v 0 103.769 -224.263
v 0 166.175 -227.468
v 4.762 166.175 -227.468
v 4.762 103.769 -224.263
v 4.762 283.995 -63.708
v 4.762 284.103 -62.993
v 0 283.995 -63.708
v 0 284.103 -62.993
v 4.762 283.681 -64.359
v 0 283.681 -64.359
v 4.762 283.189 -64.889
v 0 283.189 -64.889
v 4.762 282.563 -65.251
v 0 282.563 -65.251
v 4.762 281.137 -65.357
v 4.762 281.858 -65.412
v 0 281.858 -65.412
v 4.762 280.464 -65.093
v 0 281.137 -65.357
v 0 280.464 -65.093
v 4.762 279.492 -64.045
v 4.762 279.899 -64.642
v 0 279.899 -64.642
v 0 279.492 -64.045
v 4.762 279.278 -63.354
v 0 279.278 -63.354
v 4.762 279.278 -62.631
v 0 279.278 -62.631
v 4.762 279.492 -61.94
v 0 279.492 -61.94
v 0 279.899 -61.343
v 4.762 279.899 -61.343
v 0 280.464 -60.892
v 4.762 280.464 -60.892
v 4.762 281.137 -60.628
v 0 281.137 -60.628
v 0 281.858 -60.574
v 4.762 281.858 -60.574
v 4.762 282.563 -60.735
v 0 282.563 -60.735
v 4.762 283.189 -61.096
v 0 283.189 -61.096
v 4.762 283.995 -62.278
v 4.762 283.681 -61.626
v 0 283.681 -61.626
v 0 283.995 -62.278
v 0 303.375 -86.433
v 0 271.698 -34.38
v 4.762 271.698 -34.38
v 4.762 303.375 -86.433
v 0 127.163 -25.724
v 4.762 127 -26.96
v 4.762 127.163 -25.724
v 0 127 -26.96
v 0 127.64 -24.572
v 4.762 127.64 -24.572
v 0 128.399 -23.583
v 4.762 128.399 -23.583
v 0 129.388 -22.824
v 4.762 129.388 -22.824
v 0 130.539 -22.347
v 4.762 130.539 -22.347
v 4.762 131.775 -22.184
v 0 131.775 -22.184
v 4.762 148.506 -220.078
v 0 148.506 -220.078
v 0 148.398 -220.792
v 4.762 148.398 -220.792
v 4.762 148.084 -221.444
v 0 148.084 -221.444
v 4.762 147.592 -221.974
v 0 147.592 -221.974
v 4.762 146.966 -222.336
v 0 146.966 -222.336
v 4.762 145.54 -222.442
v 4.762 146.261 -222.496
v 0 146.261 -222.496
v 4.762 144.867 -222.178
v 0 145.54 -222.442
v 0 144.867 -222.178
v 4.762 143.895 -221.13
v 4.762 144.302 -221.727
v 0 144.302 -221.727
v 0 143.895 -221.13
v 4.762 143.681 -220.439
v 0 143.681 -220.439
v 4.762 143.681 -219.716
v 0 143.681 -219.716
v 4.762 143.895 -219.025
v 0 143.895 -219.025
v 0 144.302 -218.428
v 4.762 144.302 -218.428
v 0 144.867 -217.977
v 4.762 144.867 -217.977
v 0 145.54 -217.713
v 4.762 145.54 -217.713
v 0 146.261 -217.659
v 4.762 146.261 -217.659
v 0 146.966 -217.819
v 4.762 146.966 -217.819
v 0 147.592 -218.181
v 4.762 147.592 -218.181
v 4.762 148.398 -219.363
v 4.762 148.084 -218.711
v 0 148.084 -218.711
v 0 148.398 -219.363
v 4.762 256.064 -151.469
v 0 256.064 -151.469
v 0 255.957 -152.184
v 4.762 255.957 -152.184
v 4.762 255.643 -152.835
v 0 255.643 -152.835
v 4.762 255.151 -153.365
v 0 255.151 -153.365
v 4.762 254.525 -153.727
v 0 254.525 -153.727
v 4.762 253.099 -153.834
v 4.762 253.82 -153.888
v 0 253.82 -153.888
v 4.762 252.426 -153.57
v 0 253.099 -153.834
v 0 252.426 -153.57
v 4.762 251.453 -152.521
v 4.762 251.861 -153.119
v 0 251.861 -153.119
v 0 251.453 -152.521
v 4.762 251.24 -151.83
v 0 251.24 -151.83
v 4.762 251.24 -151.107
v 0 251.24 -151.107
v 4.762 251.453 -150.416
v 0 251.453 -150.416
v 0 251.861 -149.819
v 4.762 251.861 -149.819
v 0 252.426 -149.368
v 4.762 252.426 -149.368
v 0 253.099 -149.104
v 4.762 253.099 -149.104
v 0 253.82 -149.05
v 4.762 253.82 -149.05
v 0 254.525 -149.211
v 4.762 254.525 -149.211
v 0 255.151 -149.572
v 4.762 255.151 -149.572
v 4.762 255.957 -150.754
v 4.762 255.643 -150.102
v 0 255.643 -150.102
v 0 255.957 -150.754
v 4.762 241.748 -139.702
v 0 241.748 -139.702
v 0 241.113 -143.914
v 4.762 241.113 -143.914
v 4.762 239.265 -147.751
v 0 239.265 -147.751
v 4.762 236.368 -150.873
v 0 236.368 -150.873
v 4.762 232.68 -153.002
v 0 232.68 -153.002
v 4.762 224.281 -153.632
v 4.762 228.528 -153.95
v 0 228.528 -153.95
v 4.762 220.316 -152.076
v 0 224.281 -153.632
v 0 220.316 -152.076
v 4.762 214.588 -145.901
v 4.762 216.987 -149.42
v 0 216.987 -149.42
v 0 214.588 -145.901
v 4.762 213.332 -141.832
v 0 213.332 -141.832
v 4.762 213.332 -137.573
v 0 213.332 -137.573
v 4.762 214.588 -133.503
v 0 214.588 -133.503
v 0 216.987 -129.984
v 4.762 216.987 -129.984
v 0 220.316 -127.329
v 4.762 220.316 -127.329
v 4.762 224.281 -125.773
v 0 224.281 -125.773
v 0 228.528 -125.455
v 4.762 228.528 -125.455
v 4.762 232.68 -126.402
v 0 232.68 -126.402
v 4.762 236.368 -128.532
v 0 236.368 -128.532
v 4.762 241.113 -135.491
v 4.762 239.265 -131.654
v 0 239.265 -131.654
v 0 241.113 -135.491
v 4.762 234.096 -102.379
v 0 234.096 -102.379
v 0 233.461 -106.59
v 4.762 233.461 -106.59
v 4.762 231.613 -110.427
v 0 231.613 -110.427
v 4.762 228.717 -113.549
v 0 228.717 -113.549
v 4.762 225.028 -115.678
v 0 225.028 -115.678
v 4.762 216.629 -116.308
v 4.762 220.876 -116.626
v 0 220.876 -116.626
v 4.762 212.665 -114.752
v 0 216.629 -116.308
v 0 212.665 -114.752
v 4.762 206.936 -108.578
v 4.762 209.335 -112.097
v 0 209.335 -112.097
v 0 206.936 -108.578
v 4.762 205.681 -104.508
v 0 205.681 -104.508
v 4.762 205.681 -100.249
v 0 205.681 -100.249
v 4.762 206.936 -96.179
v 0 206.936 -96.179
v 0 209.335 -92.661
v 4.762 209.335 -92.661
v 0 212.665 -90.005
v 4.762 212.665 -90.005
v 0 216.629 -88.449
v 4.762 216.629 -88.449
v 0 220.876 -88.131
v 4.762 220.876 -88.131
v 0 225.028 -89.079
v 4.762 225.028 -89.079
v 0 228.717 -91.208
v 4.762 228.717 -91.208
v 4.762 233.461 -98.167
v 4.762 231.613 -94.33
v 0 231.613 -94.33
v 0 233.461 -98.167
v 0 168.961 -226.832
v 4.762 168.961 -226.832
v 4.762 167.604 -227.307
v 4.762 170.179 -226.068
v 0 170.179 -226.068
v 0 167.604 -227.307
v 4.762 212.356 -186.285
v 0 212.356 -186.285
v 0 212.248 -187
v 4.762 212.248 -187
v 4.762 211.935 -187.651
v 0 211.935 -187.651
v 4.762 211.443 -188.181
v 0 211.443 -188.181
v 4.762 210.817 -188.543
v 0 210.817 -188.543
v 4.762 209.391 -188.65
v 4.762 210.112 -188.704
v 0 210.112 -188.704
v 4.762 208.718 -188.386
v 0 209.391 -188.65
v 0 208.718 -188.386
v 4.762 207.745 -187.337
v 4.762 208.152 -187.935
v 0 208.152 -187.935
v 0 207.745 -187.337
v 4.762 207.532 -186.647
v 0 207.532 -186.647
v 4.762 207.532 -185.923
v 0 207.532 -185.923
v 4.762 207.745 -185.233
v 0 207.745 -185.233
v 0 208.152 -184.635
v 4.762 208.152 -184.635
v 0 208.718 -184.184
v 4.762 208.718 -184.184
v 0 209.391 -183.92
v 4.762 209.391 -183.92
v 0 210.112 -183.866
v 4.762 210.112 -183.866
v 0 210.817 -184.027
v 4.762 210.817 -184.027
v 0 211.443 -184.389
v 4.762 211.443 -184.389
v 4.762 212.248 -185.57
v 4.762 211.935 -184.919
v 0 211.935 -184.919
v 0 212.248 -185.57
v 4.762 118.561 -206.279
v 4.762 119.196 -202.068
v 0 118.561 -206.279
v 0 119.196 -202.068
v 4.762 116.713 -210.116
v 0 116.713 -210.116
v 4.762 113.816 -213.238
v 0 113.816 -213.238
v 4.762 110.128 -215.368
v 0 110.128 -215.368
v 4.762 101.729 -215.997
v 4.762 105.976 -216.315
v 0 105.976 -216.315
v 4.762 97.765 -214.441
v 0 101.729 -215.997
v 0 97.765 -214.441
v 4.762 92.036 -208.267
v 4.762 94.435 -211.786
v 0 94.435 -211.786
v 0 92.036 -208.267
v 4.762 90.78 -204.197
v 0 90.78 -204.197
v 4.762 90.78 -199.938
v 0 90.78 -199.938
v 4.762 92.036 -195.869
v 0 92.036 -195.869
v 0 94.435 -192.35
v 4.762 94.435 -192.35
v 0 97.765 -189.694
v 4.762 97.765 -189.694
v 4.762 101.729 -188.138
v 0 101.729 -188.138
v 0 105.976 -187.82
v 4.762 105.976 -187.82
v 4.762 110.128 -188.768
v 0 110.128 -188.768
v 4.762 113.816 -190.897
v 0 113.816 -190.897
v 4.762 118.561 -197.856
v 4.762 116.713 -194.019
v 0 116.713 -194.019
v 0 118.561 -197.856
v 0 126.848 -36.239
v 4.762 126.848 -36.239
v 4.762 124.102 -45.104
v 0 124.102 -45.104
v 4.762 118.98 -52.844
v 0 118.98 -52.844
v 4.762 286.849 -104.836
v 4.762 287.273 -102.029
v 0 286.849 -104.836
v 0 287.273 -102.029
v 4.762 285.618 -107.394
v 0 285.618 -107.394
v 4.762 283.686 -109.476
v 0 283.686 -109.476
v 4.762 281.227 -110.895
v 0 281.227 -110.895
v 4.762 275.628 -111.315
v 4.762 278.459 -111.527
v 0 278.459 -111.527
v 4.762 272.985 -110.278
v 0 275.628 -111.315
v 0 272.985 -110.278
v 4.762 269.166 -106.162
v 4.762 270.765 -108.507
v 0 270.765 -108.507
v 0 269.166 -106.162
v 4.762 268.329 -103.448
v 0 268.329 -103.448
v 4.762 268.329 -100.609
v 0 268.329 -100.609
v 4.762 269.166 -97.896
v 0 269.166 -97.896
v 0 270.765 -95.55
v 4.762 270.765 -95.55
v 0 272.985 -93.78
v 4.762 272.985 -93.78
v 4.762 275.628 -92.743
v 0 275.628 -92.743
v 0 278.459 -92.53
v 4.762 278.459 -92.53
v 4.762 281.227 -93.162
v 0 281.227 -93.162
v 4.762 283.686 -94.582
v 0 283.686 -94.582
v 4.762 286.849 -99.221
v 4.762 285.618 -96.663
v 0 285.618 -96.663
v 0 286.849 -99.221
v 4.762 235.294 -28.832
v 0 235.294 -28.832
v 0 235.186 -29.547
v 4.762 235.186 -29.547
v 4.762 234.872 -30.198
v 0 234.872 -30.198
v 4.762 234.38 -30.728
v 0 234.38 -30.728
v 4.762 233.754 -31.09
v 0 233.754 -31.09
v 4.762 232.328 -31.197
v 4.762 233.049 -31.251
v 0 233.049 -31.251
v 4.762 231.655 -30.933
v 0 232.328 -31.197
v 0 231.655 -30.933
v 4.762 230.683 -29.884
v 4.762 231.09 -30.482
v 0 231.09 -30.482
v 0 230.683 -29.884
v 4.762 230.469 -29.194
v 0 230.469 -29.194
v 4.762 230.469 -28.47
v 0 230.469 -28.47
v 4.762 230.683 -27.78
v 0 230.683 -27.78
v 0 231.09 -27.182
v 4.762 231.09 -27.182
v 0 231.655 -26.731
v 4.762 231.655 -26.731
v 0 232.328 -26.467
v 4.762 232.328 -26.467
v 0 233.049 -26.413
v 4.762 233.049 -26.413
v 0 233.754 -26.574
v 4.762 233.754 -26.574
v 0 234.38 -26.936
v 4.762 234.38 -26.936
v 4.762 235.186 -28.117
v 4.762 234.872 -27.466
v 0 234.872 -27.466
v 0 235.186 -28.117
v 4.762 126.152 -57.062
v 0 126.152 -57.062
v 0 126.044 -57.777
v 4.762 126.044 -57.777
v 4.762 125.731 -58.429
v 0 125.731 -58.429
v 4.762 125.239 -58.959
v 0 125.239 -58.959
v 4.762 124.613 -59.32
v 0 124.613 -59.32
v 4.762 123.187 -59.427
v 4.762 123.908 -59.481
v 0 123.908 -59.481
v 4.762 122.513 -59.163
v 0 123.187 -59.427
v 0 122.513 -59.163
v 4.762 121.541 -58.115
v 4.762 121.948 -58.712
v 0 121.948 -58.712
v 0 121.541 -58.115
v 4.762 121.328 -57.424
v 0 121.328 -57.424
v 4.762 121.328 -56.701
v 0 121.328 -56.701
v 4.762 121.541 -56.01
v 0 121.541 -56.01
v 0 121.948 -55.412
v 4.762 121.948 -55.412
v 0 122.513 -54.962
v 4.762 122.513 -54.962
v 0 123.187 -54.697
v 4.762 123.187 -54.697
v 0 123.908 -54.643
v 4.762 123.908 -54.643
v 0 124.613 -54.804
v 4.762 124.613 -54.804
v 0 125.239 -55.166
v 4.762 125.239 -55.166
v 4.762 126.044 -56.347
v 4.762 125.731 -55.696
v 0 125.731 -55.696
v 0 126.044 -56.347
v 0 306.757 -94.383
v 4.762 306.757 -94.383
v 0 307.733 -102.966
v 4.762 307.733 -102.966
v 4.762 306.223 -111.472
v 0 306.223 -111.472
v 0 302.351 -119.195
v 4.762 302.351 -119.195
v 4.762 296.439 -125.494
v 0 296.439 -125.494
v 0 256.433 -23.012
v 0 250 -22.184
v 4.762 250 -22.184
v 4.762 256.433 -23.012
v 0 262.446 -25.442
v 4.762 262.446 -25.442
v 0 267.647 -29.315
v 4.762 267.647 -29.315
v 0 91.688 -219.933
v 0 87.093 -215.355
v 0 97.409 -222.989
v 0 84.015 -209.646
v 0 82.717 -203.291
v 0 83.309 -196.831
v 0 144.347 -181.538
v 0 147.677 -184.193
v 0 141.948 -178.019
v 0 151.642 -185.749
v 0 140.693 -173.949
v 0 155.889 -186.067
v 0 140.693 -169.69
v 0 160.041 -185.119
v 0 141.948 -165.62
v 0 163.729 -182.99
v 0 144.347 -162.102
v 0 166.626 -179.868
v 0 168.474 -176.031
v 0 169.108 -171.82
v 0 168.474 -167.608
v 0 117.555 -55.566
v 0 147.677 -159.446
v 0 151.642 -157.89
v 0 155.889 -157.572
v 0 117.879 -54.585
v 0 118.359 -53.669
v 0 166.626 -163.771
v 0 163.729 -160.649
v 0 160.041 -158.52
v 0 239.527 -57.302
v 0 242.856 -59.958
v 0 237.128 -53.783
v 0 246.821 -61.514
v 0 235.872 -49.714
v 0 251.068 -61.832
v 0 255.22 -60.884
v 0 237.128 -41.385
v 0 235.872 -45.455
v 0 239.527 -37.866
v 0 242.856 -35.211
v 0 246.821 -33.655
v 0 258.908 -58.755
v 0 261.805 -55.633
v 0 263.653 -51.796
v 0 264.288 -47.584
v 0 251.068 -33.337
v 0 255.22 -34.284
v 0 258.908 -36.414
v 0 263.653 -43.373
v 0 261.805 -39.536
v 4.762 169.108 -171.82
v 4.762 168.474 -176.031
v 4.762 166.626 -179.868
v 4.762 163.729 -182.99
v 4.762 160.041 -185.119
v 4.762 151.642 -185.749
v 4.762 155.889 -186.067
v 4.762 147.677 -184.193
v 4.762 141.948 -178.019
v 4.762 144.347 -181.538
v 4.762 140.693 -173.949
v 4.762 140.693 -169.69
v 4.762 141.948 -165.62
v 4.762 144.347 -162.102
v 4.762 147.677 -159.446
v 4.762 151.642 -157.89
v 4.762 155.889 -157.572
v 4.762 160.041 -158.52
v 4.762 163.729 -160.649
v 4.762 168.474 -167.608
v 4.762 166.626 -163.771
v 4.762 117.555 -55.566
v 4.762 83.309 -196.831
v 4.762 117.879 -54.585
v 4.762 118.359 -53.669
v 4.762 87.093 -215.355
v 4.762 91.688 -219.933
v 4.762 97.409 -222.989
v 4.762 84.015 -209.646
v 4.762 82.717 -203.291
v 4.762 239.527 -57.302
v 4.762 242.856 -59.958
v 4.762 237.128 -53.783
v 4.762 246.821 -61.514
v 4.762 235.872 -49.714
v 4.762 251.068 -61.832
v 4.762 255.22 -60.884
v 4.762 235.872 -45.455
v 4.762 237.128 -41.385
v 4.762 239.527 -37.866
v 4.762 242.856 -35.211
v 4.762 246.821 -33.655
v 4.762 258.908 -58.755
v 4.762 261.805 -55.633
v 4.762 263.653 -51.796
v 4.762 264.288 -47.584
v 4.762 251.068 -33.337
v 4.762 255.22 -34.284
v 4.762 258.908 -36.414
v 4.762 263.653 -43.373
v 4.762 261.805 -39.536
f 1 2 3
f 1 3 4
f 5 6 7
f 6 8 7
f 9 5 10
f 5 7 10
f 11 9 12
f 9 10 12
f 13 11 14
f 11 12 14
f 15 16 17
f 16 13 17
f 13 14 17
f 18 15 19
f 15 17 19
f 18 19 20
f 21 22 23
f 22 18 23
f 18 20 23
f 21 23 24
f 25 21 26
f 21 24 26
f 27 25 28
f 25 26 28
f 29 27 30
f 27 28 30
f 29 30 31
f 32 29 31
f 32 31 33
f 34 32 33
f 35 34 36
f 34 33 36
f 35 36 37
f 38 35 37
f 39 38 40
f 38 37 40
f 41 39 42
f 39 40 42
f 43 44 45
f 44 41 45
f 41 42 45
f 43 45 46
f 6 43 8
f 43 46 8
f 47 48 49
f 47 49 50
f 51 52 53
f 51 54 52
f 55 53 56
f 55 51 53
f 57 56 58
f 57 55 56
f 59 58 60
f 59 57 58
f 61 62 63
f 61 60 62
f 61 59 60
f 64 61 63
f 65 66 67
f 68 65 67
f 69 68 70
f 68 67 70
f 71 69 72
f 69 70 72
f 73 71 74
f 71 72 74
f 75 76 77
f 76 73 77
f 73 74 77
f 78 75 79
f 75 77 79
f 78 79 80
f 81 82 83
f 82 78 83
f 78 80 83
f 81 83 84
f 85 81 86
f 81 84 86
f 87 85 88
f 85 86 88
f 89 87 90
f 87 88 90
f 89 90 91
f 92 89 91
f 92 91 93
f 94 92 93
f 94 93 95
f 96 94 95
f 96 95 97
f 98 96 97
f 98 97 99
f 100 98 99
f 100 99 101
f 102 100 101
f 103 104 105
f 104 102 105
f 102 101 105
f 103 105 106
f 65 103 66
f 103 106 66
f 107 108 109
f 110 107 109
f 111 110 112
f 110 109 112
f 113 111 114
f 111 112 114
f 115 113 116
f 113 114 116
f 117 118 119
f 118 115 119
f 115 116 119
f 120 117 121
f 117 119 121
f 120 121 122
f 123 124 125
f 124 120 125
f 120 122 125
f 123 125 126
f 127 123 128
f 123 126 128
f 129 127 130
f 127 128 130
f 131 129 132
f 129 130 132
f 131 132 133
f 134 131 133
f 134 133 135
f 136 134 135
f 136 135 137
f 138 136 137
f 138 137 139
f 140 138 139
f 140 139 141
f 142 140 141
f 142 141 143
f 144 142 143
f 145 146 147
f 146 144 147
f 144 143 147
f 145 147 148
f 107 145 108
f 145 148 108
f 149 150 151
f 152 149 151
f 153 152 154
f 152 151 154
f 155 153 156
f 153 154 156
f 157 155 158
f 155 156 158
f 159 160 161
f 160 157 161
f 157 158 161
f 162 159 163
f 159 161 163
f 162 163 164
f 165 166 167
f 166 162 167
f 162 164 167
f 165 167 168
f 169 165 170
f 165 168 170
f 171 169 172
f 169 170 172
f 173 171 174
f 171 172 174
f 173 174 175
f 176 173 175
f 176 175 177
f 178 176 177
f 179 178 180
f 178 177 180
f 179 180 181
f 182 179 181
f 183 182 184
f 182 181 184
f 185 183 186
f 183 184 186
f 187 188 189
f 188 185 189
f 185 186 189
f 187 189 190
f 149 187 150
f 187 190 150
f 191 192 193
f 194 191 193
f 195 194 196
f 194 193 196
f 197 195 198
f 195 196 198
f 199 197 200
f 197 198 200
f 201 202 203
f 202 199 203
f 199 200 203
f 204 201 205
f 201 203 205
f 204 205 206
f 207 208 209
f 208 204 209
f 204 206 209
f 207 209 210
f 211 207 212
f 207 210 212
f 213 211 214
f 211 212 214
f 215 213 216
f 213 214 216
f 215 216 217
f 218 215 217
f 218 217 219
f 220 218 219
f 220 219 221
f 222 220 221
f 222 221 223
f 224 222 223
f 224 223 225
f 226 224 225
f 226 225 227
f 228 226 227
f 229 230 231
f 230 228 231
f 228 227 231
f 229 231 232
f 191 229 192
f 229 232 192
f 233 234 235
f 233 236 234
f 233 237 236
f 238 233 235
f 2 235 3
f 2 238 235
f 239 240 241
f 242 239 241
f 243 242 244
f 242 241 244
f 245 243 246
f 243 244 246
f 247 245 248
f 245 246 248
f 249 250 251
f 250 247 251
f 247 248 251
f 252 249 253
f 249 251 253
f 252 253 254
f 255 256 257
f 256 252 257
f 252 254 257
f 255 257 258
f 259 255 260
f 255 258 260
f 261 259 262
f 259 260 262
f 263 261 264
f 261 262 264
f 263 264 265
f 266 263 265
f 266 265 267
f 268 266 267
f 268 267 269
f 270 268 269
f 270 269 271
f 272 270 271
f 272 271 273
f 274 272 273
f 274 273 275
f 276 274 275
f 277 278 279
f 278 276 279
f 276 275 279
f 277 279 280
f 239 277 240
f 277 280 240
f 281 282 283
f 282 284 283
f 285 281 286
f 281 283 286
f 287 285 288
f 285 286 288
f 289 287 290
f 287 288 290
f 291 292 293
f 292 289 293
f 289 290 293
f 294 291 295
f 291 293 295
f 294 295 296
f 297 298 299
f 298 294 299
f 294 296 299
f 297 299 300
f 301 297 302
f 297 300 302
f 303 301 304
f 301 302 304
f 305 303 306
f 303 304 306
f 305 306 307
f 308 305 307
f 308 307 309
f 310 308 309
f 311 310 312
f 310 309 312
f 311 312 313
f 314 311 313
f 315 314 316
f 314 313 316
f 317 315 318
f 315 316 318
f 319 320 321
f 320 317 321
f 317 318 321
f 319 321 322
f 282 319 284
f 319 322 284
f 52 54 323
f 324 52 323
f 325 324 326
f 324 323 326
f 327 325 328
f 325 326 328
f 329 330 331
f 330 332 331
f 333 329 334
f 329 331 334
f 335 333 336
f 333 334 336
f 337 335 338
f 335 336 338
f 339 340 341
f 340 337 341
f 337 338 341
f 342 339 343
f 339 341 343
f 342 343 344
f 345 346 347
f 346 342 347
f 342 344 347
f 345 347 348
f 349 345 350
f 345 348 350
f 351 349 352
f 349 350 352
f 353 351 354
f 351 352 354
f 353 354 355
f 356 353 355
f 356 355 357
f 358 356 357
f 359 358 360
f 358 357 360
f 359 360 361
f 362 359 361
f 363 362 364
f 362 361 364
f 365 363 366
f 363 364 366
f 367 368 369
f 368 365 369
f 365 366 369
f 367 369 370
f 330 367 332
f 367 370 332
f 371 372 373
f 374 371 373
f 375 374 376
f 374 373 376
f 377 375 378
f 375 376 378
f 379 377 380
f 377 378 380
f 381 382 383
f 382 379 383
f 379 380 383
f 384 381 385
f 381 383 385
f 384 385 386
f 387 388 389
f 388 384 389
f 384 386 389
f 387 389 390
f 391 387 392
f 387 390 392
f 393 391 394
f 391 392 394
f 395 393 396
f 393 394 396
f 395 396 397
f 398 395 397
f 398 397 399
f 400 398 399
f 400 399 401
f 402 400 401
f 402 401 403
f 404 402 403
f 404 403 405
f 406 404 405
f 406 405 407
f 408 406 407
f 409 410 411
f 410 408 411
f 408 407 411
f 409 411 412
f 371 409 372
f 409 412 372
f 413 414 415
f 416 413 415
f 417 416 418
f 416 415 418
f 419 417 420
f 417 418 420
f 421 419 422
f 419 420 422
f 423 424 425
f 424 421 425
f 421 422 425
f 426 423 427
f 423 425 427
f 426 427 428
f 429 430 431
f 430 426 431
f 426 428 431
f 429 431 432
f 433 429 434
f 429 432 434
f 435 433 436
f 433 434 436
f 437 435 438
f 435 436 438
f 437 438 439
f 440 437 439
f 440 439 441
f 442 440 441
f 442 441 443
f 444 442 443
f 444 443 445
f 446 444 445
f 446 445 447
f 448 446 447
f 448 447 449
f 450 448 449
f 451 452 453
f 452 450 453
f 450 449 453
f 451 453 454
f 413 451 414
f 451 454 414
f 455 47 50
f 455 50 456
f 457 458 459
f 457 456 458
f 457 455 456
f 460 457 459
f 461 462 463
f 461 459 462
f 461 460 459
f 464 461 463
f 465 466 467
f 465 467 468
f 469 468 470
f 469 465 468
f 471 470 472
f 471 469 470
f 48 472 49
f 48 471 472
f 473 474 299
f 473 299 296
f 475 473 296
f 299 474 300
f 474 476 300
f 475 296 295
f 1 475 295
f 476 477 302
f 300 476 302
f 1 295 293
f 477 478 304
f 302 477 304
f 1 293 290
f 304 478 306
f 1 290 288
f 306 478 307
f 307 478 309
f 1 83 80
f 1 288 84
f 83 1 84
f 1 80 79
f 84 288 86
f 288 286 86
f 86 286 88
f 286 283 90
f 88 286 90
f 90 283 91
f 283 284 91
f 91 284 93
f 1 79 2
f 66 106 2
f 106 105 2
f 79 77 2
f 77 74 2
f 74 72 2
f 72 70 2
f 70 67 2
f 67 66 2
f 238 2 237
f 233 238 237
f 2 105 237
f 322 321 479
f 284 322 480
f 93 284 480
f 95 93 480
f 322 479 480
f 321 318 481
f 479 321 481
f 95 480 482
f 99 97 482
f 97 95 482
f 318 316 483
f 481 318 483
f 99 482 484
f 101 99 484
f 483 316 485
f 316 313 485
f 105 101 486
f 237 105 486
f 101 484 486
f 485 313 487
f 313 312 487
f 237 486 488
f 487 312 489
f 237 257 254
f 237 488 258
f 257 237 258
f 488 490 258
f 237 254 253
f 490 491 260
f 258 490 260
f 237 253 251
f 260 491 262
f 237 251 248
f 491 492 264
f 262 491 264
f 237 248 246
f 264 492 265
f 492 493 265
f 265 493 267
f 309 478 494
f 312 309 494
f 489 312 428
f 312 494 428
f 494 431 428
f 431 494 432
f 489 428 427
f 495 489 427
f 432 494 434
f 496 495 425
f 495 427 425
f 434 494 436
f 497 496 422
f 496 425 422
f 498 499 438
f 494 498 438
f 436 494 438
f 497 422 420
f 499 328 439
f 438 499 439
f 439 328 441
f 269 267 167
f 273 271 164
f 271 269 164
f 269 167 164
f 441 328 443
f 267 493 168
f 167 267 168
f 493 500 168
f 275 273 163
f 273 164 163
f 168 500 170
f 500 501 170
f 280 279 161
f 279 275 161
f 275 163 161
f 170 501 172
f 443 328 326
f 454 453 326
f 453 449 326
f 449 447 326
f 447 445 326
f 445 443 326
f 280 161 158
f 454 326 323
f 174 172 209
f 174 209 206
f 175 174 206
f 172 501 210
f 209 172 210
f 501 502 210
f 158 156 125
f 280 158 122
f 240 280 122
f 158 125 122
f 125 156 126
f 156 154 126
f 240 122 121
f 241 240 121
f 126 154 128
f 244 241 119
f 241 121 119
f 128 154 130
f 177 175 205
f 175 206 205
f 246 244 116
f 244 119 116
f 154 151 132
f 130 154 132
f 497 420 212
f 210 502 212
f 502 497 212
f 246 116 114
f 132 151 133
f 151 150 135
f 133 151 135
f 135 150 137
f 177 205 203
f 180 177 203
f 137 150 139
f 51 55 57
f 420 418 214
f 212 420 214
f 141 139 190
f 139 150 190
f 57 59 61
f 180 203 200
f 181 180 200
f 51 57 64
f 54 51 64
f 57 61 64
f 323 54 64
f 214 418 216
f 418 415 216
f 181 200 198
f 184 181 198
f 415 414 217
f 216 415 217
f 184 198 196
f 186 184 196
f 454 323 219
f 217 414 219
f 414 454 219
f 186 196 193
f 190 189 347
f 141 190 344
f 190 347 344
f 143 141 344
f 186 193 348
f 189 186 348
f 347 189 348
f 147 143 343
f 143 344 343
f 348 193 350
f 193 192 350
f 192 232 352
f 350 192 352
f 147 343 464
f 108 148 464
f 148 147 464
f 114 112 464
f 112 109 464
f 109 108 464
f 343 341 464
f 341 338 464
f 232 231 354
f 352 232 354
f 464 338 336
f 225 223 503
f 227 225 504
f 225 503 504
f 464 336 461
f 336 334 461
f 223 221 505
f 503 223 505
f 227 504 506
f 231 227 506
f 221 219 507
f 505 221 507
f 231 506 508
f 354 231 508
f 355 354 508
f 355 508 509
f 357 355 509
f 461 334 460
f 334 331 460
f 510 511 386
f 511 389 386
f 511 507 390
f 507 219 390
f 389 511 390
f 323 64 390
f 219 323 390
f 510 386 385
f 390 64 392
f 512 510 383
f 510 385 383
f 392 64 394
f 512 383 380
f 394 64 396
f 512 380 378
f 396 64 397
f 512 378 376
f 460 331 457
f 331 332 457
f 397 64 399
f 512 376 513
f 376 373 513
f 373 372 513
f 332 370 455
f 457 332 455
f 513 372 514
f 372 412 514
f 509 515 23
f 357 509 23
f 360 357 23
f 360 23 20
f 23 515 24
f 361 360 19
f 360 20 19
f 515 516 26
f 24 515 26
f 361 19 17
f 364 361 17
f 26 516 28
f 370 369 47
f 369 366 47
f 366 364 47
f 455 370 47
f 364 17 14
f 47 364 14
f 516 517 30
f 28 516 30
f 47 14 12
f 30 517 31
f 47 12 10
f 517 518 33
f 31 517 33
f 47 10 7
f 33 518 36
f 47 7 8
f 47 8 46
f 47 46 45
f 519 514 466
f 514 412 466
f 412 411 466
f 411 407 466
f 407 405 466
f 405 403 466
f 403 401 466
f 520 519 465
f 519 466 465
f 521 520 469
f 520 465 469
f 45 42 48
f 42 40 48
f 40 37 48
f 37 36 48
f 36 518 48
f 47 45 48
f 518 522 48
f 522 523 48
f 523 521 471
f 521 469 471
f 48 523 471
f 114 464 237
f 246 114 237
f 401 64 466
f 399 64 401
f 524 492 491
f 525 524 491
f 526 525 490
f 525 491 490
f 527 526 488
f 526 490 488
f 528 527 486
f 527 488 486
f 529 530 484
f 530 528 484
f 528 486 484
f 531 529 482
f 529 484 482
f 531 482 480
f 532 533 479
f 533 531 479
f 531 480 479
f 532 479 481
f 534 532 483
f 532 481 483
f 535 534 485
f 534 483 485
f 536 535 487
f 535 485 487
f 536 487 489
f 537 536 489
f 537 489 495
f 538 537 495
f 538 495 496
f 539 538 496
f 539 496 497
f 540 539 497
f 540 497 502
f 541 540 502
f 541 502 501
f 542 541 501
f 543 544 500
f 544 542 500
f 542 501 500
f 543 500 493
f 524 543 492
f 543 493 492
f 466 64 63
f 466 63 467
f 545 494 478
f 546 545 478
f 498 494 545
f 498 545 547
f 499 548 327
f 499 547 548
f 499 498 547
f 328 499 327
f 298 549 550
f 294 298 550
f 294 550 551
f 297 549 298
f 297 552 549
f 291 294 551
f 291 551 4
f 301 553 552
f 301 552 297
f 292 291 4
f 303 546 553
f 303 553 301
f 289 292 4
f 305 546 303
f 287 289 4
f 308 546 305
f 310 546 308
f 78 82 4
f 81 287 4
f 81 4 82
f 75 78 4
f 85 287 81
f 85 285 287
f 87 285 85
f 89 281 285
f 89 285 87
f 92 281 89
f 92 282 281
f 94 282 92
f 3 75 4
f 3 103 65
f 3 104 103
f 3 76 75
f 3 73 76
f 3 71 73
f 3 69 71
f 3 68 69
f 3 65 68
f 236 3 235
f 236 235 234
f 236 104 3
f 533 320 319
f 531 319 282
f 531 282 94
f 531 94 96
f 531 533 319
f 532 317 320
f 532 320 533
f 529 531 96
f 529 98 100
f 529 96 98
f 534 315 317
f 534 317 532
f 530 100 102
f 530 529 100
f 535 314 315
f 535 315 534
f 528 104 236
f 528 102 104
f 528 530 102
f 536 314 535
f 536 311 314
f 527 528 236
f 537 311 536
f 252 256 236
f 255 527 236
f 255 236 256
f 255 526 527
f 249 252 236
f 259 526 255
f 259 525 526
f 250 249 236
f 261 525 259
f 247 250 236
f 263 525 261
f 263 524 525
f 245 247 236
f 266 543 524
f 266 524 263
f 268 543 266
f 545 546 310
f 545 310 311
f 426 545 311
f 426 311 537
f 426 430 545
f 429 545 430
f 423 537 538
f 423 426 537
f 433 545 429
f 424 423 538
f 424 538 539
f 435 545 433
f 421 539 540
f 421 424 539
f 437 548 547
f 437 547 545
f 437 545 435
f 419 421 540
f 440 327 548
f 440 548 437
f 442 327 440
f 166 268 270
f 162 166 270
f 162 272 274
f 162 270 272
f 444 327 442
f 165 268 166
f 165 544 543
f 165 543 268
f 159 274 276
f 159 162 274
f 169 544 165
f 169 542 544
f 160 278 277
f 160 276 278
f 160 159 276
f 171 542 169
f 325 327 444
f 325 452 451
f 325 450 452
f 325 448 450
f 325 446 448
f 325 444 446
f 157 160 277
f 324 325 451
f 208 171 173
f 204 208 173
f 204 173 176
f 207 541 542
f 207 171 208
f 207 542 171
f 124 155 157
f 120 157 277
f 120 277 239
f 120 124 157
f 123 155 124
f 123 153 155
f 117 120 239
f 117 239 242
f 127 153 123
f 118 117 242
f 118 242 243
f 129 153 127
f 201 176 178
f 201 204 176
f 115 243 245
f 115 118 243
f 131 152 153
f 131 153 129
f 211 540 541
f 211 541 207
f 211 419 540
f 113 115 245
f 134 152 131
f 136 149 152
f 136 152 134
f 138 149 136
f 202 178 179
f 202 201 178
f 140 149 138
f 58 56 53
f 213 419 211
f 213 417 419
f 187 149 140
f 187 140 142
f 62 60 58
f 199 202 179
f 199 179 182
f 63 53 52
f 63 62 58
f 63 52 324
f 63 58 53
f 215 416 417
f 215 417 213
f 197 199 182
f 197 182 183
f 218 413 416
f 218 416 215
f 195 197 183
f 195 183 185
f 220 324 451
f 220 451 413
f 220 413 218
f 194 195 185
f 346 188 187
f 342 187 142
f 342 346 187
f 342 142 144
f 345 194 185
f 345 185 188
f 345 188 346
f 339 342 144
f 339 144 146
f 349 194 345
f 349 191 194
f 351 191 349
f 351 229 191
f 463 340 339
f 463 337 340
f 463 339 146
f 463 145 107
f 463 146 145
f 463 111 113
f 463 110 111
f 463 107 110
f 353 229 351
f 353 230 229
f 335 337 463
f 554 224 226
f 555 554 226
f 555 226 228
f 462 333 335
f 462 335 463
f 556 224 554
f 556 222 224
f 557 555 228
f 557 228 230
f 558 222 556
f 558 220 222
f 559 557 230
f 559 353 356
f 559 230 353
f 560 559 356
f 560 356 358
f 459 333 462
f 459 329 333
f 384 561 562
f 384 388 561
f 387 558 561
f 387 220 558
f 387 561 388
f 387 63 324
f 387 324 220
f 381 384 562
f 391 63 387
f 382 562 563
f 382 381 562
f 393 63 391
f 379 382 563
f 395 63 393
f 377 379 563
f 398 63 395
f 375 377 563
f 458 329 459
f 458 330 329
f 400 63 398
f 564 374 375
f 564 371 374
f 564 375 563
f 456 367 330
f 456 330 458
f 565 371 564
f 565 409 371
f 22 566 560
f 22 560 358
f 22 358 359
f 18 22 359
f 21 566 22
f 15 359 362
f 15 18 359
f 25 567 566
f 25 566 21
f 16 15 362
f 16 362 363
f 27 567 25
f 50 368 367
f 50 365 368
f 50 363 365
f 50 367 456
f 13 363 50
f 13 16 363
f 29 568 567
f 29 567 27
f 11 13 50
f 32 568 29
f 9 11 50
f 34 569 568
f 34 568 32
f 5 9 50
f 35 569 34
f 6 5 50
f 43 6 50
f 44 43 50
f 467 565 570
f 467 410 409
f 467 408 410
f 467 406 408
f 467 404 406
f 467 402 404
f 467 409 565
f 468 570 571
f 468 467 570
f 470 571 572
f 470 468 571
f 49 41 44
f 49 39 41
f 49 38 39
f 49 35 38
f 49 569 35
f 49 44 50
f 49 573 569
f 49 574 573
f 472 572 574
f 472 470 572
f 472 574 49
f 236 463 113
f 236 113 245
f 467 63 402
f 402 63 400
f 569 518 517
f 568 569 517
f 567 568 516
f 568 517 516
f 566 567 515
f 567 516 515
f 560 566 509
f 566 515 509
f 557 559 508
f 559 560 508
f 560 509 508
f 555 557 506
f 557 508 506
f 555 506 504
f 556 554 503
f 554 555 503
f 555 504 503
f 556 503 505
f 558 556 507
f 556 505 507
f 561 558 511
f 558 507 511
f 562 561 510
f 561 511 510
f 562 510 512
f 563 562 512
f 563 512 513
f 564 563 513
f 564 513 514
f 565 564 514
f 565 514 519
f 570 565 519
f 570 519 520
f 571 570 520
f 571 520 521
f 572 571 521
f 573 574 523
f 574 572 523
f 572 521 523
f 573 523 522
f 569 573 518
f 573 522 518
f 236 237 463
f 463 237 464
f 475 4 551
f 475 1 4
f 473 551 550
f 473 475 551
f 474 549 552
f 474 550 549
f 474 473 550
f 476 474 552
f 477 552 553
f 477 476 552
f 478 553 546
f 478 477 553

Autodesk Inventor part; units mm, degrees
ref_plane "YZ Plane" through (0, 0, 0) normal (1, 0, 0) x (0, 1, 0)
ref_plane "XZ Plane" through (0, 0, 0) normal (0, 1, 0) x (-1, 0, 0)
ref_plane "XY Plane" through (0, 0, 0) normal (0, 0, 1) x (1, 0, 0)
sketch "Sketch1" plane through (0, 0, 0) normal (1, 0, 0) x (0, 1, 0)
  line L0 (95.25, -63.5) -> (7.9502, -63.5) construction
  arc A0 (95.25, -63.5) -> (127, -31.75) centre (95.25, -31.75) ccw construction
  circle A1 centre (104.9083, -202.0677) radius 25.4 construction
  circle A2 centre (104.9083, -202.0677) radius 14.2875
  circle A3 centre (154.8209, -171.8196) radius 25.4 construction
  circle A4 centre (154.8209, -171.8196) radius 14.2875
  circle A5 centre (250.0002, -47.5843) radius 22.225 construction
  circle A6 centre (250.0002, -47.5843) radius 25.4 construction
  circle A7 centre (250.0002, -47.5843) radius 14.2875
  circle A8 centre (154.8209, -171.8196) radius 22.225 construction
  circle A9 centre (104.9083, -202.0677) radius 22.225 construction
  circle A10 centre (25.4, -99.06) radius 25.4 construction
  circle A11 centre (25.4, -99.06) radius 23.8125 construction
  line L1 (25.4, -73.66) -> (25.4, -63.5) construction
  circle A12 centre (219.8086, -102.3786) radius 25.4 construction
  circle A13 centre (219.8086, -102.3786) radius 22.225 construction
  circle A14 centre (219.8086, -102.3786) radius 14.2875
  circle A15 centre (63.172, -79.375) radius 6.477 construction
  circle A16 centre (25.4, -99.06) radius 14.2875
  circle A17 centre (63.172, -79.375) radius 3.2512 construction
  circle A18 centre (166.1747, -221.0415) radius 3.2512 construction
  line L2 (219.8086, -102.3786) -> (154.8209, -171.8196) construction
  line L3 (154.8209, -171.8196) -> (104.9083, -202.0677) construction
  circle A19 centre (166.1747, -221.0415) radius 6.4262 construction
  circle A20 centre (63.172, -79.375) radius 6.35 construction
  circle A21 centre (25.4, -99.06) radius 22.225 construction
  line L4 (3.175, -99.06) -> (3.175, -68.2752) construction
  arc A22 (166.1747, -227.4677) -> (170.1786, -226.0679) centre (166.1747, -221.0415) ccw
  arc A23 (3.175, -99.06) -> (35.6756, -118.7669) centre (25.4, -99.06) ccw construction
  arc A24 (7.9502, -63.5) -> (3.175, -68.2752) centre (7.9502, -68.2752) ccw construction
  line L5 (232.868, -28.832) -> (267.1324, -66.3365) construction
  circle A25 centre (232.868, -28.832) radius 2.4257
  circle A26 centre (267.1324, -66.3365) radius 2.4257 construction
  circle A27 centre (232.868, -28.832) radius 6.35 construction
  circle A28 centre (267.1324, -66.3365) radius 6.35 construction
  line L6 (219.8086, -102.3786) -> (237.1646, -83.8332) construction
  line L7 (219.8086, -102.3786) -> (202.4526, -120.9239) construction
  circle A29 centre (237.1646, -83.8332) radius 2.4257 construction
  circle A30 centre (202.4526, -120.9239) radius 2.4257 construction
  circle A31 centre (172.1769, -153.2743) radius 2.4257 construction
  circle A32 centre (133.0985, -184.9838) radius 2.4257 construction
  arc A33 (83.3089, -196.8314) -> (103.7686, -224.2634) centre (104.9083, -202.0677) ccw
  circle A34 centre (9.525, -79.2321) radius 2.4257
  circle A35 centre (9.525, -79.2321) radius 6.35 construction
  line L8 (9.525, -79.2321) -> (41.275, -118.8879) construction
  circle A36 centre (41.275, -118.8879) radius 2.4257 construction
  circle A37 centre (41.275, -118.8879) radius 5.6007 construction
  line L9 (7.9502, -63.5) -> (95.25, -63.5) construction
  arc A38 (95.25, -63.5) -> (127, -31.75) centre (95.25, -31.75) ccw construction
  line L10 (166.1747, -227.4677) -> (103.7686, -224.2634)
  line L11 (104.9083, -202.0677) -> (83.1859, -215.2319) construction
  line L12 (127, -31.75) -> (127, -26.9595) construction
  circle A39 centre (133.0985, -184.9838) radius 5.6007 construction
  circle A40 centre (277.7476, -102.0288) radius 30 construction
  circle A41 centre (277.7476, -102.0288) radius 25.4 construction
  circle A42 centre (277.7476, -102.0288) radius 9.525
  circle A43 centre (219.8086, -102.3786) radius 19.05 construction
  circle A44 centre (227.4601, -139.7023) radius 19.05 construction
  circle A45 centre (227.4601, -139.7023) radius 14.2875
  line L13 (247.7482, -102.2099) -> (245.2082, -102.2252) construction
  line L14 (170.1786, -226.0679) -> (296.4391, -125.4942)
  arc A46 (296.4391, -125.4942) -> (303.3752, -86.4331) centre (277.7476, -102.0288) ccw
  circle A47 centre (219.8086, -102.3786) radius 30.48 construction
  circle A48 centre (277.7476, -102.0288) radius 30.48 construction
  circle A49 centre (248.6408, -79.4624) radius 3.81 construction
  line L15 (251.6519, -81.7968) -> (253.6592, -83.3531) construction
  line L16 (245.6582, -81.833) -> (243.6698, -83.4134) construction
  circle A50 centre (248.6408, -79.4624) radius 2.3812 construction
  circle A51 centre (248.9154, -124.945) radius 3.81 construction
  circle A52 centre (248.9154, -124.945) radius 2.3876 construction
  line L17 (251.898, -122.5744) -> (253.8865, -120.9939) construction
  line L18 (245.9043, -122.6105) -> (243.897, -121.0542) construction
  line L19 (248.6408, -75.6524) -> (248.6408, -72.9479) construction
  line L20 (219.8086, -102.3786) -> (219.8086, -88.0911) construction
  line L21 (131.7752, -22.1843) -> (250.0002, -22.1843)
  line L22 (271.6983, -34.3799) -> (303.3752, -86.4331)
  arc A53 (271.6983, -34.3799) -> (250.0002, -22.1843) centre (250.0002, -47.5843) ccw
  arc A54 (131.7752, -22.1843) -> (127, -26.9595) centre (131.7752, -26.9595) ccw
  circle A55 centre (146.08, -220.0775) radius 6.35 construction
  circle A56 centre (146.08, -220.0775) radius 2.4257
  circle A57 centre (253.6387, -151.4689) radius 6.35 construction
  circle A58 centre (253.6387, -151.4689) radius 2.4257
  circle A59 centre (209.9304, -186.285) radius 6.35 construction
  circle A60 centre (209.9304, -186.285) radius 2.4257
  circle A61 centre (123.7263, -57.0623) radius 6.35 construction
  circle A62 centre (123.7263, -57.0623) radius 2.4257
  circle A63 centre (281.6771, -62.9926) radius 6.35 construction
  circle A64 centre (281.6771, -62.9926) radius 2.4257
  line L23 (123.7263, -57.0623) -> (232.868, -28.832) construction
  line L24 (232.868, -28.832) -> (281.6771, -62.9926) construction
  line L25 (281.6771, -62.9926) -> (253.6387, -151.4689) construction
  line L26 (253.6387, -151.4689) -> (209.9304, -186.285) construction
  line L27 (209.9304, -186.285) -> (146.08, -220.0775) construction
  line L28 (146.08, -220.0775) -> (9.525, -79.2321) construction
  line L29 (123.7263, -57.0623) -> (9.525, -79.2321) construction
  line L30 (117.555, -55.5662) -> (83.3089, -196.8314)
  arc A65 (118.9802, -52.8436) -> (127, -26.9595) centre (94.4844, -31.0695) ccw
  arc A66 (118.9802, -52.8436) -> (117.555, -55.5662) centre (123.7263, -57.0623) ccw
  point P0 (180.2209, -171.8196)
  point P1 (172.6009, -221.0415)
  point P2 (104.9083, -227.4677)
  point P3 (127, -22.1843)
  point P4 (250.0002, -47.5843)
  point P5 (0, 0)
  point P6 (95.25, -63.5)
  dimension "d4" = 31.75
  dimension "d17" = 50.8
  dimension "d18" = 1.5875
  dimension "d21" = 12.954
  dimension "d22" = 28.575
  dimension "d23" = 6.5024
  dimension "d26" = 130.175
  dimension "d27" = 15.875
  dimension "d28" = 6.5024
  dimension "d29" = 143.1895
  dimension "d41" = 3.175
  dimension "d42" = 12.7
  dimension "d43" = 10.16
  dimension "d44" = 50.8
  dimension "d45" = 3.175
  dimension "d46" = 44.45
  dimension "d53" = 3.175
  dimension "d55" = 4.7752
  dimension "d59" = 4.8514
  dimension "d60" = 4.8514
  dimension "d68" = 4.8514
  dimension "d69" = 4.8514
  dimension "d70" = 4.8514
  dimension "d71" = 4.8514
  dimension "d72" = 4.8514
  dimension "d74" = 4.8514
  dimension "d75" = 3.175
  dimension "d86" = 7.62
  dimension "d88" = 3.175
  dimension "d90" = 58.3628
  dimension "d92" = 60
  dimension "d93" = 50.8
  dimension "d96" = 19.05
  dimension "d97" = 38.1
  dimension "d98" = 38.1
  dimension "d99" = 28.575
  dimension "d100" = 56.9248
  dimension "d101" = 2.54
  dimension "d102" = 60.96
  dimension "d103" = 60.96
  dimension "d104" = 7.62
  dimension "d105" = 2.54
  dimension "d106" = 4.7625
  dimension "d107" = 7.62
  dimension "d108" = 4.7752
  dimension "d109" = 2.54
  dimension "d111" = 2.7045
  dimension "d112" = 38.682
  dimension "d113" = 7.6515
  dimension "d114" = 202.0601
  dimension "d115" = 40.6423
  dimension "d116" = 37.3238
  dimension "d117" = 95.1077
  dimension "d118" = 57.939
  dimension "d119" = 62.8341
  dimension "d120" = 61.1075
  dimension "d121" = 250.0002
  dimension "d122" = 99.06
  dimension "d123" = 25.4
  dimension "d125" = 127
  dimension "d128" = 130.1236
  dimension "d129" = 232.868
  dimension "d130" = 4.7752
  dimension "d131" = 22.1843
extrude "Extrusion2" add sketch "Sketch1" along normal blind 4.7625 contours L10 A33 L30 A66 A65 A54 L21 A53 L22 A46 L14 A22
properties part number "INTK_001_PulleyCover" material "Polycarbonate, Clear"
